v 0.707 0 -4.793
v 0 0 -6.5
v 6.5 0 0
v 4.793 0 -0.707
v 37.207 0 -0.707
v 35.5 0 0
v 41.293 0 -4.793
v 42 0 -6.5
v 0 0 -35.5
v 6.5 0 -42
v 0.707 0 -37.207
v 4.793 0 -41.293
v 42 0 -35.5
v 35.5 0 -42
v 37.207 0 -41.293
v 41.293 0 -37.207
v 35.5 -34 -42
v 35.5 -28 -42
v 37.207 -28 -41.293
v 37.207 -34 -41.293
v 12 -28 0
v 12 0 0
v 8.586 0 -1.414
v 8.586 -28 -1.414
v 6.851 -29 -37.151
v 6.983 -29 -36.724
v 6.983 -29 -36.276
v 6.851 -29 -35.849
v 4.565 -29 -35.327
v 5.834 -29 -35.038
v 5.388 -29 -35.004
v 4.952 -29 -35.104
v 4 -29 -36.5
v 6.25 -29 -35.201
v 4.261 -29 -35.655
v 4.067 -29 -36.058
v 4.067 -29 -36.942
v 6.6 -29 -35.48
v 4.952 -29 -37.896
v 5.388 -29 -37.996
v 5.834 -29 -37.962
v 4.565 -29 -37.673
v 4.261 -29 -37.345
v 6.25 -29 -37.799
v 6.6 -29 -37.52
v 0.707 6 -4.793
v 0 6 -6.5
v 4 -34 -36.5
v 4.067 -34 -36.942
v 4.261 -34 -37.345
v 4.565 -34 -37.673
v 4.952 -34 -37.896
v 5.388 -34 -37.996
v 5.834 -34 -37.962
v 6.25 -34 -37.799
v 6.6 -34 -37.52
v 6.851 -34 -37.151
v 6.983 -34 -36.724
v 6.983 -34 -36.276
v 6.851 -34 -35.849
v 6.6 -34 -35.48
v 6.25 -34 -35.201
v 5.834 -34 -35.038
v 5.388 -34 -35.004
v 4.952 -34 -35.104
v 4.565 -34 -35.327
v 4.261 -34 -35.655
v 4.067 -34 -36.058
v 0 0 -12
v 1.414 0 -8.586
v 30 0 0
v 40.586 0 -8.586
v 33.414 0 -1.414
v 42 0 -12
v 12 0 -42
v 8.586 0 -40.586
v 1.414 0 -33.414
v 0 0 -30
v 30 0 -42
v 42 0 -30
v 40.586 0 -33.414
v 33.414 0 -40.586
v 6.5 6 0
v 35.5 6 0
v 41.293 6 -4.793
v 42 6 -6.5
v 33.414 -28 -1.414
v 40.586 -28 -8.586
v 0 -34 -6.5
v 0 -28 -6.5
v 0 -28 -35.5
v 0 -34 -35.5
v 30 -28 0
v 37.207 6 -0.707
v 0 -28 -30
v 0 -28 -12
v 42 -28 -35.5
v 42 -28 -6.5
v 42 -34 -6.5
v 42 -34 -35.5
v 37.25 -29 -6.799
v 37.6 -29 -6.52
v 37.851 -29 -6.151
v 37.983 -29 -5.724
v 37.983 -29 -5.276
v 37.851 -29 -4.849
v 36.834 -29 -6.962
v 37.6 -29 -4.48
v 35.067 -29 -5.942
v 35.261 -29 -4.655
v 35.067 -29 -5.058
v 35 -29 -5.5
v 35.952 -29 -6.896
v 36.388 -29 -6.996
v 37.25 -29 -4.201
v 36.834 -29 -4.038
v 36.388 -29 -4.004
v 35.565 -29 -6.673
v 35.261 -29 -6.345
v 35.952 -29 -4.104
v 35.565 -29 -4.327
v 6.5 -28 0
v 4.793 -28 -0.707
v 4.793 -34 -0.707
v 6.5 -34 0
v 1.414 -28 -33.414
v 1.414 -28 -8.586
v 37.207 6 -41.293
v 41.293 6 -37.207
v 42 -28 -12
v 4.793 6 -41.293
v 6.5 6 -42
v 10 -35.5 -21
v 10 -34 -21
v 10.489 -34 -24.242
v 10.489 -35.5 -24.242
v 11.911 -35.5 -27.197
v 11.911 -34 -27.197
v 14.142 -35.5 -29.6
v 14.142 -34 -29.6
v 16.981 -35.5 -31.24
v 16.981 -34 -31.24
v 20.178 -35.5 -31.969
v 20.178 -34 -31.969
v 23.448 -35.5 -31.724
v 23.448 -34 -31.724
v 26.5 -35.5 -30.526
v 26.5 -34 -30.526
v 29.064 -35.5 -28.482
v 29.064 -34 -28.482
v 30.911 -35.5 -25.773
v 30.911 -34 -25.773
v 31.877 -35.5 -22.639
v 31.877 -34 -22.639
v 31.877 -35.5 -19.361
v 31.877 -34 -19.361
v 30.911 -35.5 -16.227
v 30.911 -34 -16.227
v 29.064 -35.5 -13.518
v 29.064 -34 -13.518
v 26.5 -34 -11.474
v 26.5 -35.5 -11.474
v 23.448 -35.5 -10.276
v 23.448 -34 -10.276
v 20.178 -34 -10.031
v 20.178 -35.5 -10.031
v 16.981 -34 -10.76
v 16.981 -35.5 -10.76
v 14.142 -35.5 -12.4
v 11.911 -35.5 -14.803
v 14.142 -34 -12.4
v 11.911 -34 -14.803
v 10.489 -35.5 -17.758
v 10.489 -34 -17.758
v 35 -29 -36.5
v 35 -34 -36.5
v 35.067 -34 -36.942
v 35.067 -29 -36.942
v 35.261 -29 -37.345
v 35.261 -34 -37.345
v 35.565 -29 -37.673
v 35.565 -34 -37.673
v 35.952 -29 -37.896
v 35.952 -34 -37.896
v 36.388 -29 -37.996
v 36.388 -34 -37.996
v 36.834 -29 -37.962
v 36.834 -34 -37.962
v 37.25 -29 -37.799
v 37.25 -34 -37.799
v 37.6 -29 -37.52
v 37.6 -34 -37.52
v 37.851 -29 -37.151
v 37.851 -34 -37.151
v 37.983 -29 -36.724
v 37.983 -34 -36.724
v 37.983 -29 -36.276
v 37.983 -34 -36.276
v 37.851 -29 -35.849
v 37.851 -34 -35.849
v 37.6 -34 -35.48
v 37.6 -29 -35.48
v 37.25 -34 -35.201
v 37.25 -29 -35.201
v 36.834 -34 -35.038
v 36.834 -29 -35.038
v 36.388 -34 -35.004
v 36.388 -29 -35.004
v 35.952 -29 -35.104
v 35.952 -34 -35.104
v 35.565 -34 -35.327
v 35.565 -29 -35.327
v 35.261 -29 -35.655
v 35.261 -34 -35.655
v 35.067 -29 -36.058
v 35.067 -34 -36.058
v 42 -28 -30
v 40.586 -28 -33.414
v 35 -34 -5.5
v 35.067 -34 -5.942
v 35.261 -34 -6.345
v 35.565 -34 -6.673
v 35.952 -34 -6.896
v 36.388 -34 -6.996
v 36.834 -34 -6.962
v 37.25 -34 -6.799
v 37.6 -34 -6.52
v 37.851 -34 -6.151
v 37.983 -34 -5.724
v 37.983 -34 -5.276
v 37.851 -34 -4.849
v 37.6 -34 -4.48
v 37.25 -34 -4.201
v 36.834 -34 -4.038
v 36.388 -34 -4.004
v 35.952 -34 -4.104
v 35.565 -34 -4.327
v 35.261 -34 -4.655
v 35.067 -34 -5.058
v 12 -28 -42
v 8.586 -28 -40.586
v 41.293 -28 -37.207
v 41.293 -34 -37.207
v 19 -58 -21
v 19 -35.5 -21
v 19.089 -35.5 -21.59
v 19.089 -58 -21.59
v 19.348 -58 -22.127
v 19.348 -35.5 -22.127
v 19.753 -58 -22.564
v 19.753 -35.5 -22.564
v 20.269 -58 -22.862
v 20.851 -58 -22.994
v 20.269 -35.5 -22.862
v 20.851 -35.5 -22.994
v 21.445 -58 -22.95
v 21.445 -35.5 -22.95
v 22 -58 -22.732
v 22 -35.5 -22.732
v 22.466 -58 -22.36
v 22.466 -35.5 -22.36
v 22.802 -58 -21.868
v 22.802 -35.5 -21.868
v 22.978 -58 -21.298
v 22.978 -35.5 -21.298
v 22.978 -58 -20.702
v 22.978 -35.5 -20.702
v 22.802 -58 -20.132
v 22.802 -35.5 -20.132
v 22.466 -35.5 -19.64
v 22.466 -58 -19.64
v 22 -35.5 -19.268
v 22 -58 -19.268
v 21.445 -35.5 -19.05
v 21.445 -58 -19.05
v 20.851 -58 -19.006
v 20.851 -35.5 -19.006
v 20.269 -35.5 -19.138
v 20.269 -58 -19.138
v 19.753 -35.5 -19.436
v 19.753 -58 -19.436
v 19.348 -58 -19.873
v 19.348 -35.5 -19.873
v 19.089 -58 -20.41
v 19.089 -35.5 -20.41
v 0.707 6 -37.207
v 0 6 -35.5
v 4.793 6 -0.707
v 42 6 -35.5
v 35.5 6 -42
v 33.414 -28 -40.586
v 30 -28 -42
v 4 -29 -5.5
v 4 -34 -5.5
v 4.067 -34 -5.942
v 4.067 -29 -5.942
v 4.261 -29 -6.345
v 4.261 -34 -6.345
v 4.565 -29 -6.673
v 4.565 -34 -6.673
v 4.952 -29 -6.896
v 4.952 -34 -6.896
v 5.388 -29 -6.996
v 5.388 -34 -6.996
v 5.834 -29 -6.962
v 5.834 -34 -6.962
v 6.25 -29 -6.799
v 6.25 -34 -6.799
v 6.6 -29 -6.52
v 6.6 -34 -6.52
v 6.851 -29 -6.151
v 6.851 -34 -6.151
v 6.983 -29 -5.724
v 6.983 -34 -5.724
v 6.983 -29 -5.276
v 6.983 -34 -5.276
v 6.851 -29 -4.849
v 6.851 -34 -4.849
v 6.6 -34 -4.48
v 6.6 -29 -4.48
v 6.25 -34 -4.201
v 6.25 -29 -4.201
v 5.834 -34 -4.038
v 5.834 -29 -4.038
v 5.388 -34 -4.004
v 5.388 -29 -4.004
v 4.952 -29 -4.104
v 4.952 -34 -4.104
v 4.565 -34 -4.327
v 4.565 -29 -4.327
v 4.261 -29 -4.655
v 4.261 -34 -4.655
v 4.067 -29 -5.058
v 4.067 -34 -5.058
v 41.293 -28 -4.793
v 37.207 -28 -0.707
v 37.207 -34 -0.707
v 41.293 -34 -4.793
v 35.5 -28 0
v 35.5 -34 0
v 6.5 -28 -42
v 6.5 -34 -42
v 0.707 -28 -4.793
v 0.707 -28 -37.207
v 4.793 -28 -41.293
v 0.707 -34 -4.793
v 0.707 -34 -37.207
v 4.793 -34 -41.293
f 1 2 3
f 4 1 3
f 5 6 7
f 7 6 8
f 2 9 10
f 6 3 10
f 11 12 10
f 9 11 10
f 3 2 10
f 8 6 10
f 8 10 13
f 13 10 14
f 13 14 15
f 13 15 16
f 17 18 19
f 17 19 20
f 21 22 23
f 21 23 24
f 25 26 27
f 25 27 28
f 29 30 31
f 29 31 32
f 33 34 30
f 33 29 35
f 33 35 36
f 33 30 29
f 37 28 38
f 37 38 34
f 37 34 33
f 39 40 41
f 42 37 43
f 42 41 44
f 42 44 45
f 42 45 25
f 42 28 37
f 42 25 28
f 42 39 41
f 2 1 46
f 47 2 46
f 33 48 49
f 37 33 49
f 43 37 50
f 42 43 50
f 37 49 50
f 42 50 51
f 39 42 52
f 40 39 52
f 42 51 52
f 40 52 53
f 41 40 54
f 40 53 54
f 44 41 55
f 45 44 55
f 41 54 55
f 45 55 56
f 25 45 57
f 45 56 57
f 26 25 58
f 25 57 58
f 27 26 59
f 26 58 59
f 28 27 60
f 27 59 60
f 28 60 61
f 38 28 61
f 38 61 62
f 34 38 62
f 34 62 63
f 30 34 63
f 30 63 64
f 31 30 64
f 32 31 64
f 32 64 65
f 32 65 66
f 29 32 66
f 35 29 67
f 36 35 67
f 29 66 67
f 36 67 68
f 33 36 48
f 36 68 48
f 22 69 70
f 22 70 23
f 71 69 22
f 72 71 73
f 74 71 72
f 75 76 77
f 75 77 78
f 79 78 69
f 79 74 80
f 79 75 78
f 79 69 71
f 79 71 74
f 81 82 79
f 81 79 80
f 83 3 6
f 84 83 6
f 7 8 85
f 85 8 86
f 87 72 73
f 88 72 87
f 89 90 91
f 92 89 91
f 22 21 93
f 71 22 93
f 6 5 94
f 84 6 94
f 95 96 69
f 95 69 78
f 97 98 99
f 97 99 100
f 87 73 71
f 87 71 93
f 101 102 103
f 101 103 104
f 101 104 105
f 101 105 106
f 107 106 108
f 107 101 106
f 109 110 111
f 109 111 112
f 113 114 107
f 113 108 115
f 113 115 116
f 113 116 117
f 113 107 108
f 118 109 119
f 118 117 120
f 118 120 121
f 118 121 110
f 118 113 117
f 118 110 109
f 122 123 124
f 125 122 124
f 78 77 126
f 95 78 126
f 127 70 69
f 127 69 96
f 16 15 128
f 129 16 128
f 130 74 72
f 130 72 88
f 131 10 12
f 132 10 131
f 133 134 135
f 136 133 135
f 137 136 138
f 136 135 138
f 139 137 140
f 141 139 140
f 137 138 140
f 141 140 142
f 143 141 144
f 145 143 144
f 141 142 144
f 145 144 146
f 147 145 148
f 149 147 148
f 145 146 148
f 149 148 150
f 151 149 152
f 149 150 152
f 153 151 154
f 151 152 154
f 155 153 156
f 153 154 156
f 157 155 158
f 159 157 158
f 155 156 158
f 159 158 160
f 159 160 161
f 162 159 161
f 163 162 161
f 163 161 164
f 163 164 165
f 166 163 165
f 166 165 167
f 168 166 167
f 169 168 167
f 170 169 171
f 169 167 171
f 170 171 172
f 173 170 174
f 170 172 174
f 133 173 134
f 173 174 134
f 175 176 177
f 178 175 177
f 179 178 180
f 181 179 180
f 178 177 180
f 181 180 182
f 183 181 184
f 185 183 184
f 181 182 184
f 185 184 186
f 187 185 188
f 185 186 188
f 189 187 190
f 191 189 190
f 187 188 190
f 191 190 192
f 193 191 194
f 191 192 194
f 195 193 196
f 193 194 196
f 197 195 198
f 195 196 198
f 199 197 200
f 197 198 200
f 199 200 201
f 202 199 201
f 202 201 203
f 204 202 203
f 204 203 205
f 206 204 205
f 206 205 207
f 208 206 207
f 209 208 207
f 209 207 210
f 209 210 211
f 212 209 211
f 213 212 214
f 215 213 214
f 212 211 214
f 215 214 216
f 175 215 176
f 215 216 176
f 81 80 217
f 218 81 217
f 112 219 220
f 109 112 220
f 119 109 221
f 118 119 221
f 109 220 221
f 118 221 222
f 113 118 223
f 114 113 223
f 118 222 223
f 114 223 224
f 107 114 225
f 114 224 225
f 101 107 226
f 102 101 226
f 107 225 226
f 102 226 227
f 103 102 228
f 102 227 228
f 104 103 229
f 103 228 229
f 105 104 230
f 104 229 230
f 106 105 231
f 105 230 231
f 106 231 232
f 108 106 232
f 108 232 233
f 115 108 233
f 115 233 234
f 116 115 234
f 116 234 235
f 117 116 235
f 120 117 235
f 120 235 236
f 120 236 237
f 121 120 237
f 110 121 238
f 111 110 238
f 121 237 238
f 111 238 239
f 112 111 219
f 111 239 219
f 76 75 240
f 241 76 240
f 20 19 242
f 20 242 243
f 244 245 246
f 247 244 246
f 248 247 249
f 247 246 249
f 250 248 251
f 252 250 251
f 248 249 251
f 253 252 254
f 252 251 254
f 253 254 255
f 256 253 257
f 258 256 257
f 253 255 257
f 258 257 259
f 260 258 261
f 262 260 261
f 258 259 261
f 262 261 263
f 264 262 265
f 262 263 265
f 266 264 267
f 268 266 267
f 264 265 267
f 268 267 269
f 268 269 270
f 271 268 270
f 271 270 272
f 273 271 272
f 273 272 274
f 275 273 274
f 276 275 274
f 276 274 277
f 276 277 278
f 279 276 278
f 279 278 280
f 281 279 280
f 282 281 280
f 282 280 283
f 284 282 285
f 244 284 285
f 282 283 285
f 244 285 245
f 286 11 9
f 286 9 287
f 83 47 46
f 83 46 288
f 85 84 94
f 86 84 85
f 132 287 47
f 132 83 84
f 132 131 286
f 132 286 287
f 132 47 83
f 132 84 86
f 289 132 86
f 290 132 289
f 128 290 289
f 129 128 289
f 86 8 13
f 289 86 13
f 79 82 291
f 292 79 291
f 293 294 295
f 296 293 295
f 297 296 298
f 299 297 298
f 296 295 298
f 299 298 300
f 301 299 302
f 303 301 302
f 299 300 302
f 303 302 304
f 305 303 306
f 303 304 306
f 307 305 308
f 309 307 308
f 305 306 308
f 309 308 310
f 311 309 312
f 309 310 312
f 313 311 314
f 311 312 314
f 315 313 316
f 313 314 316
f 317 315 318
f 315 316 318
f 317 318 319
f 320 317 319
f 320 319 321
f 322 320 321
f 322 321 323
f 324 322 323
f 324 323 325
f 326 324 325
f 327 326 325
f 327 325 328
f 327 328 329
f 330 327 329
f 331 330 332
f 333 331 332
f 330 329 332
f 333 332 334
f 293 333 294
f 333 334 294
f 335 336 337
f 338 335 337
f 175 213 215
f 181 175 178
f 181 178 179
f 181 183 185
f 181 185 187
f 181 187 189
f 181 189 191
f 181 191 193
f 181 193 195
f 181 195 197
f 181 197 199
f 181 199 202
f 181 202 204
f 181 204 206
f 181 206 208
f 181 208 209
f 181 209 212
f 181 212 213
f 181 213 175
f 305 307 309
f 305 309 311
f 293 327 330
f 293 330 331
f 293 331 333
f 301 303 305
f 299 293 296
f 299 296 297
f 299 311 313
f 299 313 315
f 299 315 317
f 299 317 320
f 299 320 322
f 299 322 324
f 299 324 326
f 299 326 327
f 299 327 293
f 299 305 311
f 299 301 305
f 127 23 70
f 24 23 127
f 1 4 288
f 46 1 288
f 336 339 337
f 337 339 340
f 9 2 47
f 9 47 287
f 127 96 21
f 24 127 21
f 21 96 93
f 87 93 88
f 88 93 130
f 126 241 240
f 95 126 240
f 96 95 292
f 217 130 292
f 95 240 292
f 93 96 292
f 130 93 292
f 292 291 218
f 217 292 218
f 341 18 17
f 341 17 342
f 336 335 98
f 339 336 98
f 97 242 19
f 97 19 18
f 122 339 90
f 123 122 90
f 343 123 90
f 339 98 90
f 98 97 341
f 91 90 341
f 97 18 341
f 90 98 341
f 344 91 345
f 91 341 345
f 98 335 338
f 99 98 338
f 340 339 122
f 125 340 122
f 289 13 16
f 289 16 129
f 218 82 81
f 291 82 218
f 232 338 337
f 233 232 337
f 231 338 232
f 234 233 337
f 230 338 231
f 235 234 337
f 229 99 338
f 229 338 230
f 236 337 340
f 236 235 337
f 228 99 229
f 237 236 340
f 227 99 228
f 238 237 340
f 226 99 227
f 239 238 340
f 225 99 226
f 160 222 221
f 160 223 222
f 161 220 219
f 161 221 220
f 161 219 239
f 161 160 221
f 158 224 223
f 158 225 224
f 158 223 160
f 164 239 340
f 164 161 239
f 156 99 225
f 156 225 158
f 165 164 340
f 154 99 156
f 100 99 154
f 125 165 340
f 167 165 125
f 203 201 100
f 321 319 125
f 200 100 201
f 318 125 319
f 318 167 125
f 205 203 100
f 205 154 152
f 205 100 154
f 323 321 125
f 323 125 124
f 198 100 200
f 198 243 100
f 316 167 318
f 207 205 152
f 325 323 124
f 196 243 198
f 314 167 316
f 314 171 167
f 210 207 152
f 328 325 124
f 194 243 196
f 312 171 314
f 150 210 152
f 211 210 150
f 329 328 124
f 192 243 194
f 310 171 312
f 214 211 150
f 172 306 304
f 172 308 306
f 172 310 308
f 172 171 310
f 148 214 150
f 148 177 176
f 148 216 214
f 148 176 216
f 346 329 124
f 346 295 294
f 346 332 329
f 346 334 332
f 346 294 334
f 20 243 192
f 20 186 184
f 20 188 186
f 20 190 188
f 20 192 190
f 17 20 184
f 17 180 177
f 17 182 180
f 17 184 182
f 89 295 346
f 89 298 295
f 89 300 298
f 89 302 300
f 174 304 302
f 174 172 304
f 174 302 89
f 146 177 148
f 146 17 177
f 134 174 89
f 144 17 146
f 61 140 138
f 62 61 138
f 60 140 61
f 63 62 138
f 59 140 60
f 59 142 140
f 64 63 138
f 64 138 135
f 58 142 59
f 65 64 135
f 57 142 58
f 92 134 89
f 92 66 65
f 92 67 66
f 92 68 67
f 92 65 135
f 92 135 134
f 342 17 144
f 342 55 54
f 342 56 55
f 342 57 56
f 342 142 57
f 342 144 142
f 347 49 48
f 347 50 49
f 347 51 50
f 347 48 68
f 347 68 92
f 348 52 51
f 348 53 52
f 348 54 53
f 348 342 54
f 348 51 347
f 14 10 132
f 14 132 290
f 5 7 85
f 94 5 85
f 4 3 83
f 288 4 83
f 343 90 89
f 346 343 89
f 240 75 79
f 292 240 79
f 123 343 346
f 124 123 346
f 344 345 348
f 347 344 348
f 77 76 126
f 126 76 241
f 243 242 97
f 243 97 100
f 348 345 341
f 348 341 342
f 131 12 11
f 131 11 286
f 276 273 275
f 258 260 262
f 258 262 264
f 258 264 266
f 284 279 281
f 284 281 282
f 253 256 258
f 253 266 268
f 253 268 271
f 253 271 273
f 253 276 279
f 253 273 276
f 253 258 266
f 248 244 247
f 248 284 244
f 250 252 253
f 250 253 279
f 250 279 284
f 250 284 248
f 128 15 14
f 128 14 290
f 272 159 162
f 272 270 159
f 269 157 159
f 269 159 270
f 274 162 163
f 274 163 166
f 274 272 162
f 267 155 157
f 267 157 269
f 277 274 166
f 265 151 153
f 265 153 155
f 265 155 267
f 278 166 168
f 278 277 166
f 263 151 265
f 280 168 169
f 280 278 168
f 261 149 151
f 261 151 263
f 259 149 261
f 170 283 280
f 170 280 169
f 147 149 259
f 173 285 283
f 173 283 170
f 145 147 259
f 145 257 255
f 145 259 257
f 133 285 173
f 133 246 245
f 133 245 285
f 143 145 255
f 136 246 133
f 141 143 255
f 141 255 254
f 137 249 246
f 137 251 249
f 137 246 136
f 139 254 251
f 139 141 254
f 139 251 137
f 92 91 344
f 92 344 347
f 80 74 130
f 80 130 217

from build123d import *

# Parameters (mm, degrees)
SKETCH_1_W          = 42
SKETCH_1_H          = 42
EXTRUDE_1_DEPTH     = 6
CHAMFER_1_SIZE      = 5.5
SKETCH_2_W          = 42
SKETCH_2_H          = 42
EXTRUDE_3_DEPTH     = 28
CHAMFER_3_SIZE      = 10
CHAMFER_4_SIZE      = 2
SKETCH_4_W          = 42
SKETCH_4_H          = 42
EXTRUDE_6_DEPTH     = 6
CHAMFER_5_SIZE      = 5.5
CHAMFER_6_SIZE      = 1
CHAMFER_7_SIZE      = 1
SKETCH_5_R          = 1.5
CUT_EXTRUDE_1_DEPTH = 5
SKETCH_6_R          = 11
EXTRUDE_7_DEPTH     = 1.5
SKETCH_7_R          = 2
EXTRUDE_8_DEPTH     = 22.5


with BuildPart() as part:
    # 草图1 → 凸台-拉伸1 (new body)
    with BuildSketch(Plane(origin=(0, 0, 0), x_dir=(1, 0, 0), z_dir=(0, 1, 0))):
        with Locations((21, 21)):
            Rectangle(SKETCH_1_W, SKETCH_1_H)
    extrude(amount=EXTRUDE_1_DEPTH)

    # 倒角1
    chamfer_1_edges = [part.edges().sort_by_distance(p)[0] for p in [
        (0, 3, -42),
        (42, 3, -42),
        (42, 3, 0),
        (0, 3, 0),
    ]]
    chamfer(chamfer_1_edges, length=CHAMFER_1_SIZE)

    # 倒角7
    chamfer_7_edges = [part.edges().sort_by_distance(p)[0] for p in [
        (0, 3, -5.5),
        (0, 3, -36.5),
        (36.5, 3, -42),
        (5.5, 3, -42),
        (42, 3, -5.5),
        (42, 3, -36.5),
        (5.5, 3, 0),
        (36.5, 3, 0),
    ]]
    chamfer(chamfer_7_edges, length=CHAMFER_7_SIZE)


with BuildPart() as body_2:
    # 草图2 → 凸台-拉伸3 (new body)
    with BuildSketch(Plane(origin=(0, 0, 0), x_dir=(1, 0, 0), z_dir=(0, 1, 0))):
        with Locations((21, 21)):
            Rectangle(SKETCH_2_W, SKETCH_2_H)
    extrude(amount=-EXTRUDE_3_DEPTH)

    # 倒角3
    chamfer_3_edges = [body_2.edges().sort_by_distance(p)[0] for p in [
        (0, -14, 0),
        (0, -14, -42),
        (42, -14, -42),
        (42, -14, 0),
    ]]
    chamfer(chamfer_3_edges, length=CHAMFER_3_SIZE)

    # 倒角4
    chamfer_4_edges = [body_2.edges().sort_by_distance(p)[0] for p in [
        (42, -14, -10),
        (42, -14, -32),
        (10, -14, -42),
        (32, -14, -42),
        (10, -14, 0),
        (32, -14, 0),
        (0, -14, -32),
        (0, -14, -10),
    ]]
    chamfer(chamfer_4_edges, length=CHAMFER_4_SIZE)


with BuildPart() as body_3:
    # 草图4 → 凸台-拉伸6 (new body)
    with BuildSketch(Plane(origin=(0, -28, 0), x_dir=(-1, 0, 0), z_dir=(0, -1, 0))):
        with Locations((-21, 21)):
            Rectangle(SKETCH_4_W, SKETCH_4_H)
    extrude(amount=EXTRUDE_6_DEPTH)

    # 倒角5
    chamfer_5_edges = [body_3.edges().sort_by_distance(p)[0] for p in [
        (0, -31, 0),
        (42, -31, 0),
        (42, -31, -42),
        (0, -31, -42),
    ]]
    chamfer(chamfer_5_edges, length=CHAMFER_5_SIZE)

    # 倒角6
    chamfer_6_edges = [body_3.edges().sort_by_distance(p)[0] for p in [
        (0, -31, -36.5),
        (0, -31, -5.5),
        (36.5, -31, 0),
        (5.5, -31, 0),
        (42, -31, -36.5),
        (42, -31, -5.5),
        (36.5, -31, -42),
        (5.5, -31, -42),
    ]]
    chamfer(chamfer_6_edges, length=CHAMFER_6_SIZE)

    # 草图5 → 切除-拉伸1 (cut)
    with BuildSketch(Plane(origin=(0, -34, 0), x_dir=(-1, 0, 0), z_dir=(0, -1, 0))):
        with Locations((-5.5, 5.5)):
            Circle(SKETCH_5_R)
        with Locations((-36.5, 5.5)):
            Circle(SKETCH_5_R)
        with Locations((-36.5, 36.5)):
            Circle(SKETCH_5_R)
        with Locations((-5.5, 36.5)):
            Circle(SKETCH_5_R)
    extrude(amount=-CUT_EXTRUDE_1_DEPTH, mode=Mode.SUBTRACT)

    # 草图6 → 凸台-拉伸7 (add)
    with BuildSketch(Plane(origin=(0, -34, 0), x_dir=(-1, 0, 0), z_dir=(0, -1, 0))):
        with Locations((-21, 21)):
            Circle(SKETCH_6_R)
    extrude(amount=EXTRUDE_7_DEPTH)

    # 草图7 → 凸台-拉伸8 (add)
    with BuildSketch(Plane(origin=(0, -35.5, 0), x_dir=(-1, 0, 0), z_dir=(0, -1, 0))):
        with Locations((-21, 21)):
            Circle(SKETCH_7_R)
    extrude(amount=EXTRUDE_8_DEPTH)


solid = Compound([part.part, body_2.part, body_3.part])
